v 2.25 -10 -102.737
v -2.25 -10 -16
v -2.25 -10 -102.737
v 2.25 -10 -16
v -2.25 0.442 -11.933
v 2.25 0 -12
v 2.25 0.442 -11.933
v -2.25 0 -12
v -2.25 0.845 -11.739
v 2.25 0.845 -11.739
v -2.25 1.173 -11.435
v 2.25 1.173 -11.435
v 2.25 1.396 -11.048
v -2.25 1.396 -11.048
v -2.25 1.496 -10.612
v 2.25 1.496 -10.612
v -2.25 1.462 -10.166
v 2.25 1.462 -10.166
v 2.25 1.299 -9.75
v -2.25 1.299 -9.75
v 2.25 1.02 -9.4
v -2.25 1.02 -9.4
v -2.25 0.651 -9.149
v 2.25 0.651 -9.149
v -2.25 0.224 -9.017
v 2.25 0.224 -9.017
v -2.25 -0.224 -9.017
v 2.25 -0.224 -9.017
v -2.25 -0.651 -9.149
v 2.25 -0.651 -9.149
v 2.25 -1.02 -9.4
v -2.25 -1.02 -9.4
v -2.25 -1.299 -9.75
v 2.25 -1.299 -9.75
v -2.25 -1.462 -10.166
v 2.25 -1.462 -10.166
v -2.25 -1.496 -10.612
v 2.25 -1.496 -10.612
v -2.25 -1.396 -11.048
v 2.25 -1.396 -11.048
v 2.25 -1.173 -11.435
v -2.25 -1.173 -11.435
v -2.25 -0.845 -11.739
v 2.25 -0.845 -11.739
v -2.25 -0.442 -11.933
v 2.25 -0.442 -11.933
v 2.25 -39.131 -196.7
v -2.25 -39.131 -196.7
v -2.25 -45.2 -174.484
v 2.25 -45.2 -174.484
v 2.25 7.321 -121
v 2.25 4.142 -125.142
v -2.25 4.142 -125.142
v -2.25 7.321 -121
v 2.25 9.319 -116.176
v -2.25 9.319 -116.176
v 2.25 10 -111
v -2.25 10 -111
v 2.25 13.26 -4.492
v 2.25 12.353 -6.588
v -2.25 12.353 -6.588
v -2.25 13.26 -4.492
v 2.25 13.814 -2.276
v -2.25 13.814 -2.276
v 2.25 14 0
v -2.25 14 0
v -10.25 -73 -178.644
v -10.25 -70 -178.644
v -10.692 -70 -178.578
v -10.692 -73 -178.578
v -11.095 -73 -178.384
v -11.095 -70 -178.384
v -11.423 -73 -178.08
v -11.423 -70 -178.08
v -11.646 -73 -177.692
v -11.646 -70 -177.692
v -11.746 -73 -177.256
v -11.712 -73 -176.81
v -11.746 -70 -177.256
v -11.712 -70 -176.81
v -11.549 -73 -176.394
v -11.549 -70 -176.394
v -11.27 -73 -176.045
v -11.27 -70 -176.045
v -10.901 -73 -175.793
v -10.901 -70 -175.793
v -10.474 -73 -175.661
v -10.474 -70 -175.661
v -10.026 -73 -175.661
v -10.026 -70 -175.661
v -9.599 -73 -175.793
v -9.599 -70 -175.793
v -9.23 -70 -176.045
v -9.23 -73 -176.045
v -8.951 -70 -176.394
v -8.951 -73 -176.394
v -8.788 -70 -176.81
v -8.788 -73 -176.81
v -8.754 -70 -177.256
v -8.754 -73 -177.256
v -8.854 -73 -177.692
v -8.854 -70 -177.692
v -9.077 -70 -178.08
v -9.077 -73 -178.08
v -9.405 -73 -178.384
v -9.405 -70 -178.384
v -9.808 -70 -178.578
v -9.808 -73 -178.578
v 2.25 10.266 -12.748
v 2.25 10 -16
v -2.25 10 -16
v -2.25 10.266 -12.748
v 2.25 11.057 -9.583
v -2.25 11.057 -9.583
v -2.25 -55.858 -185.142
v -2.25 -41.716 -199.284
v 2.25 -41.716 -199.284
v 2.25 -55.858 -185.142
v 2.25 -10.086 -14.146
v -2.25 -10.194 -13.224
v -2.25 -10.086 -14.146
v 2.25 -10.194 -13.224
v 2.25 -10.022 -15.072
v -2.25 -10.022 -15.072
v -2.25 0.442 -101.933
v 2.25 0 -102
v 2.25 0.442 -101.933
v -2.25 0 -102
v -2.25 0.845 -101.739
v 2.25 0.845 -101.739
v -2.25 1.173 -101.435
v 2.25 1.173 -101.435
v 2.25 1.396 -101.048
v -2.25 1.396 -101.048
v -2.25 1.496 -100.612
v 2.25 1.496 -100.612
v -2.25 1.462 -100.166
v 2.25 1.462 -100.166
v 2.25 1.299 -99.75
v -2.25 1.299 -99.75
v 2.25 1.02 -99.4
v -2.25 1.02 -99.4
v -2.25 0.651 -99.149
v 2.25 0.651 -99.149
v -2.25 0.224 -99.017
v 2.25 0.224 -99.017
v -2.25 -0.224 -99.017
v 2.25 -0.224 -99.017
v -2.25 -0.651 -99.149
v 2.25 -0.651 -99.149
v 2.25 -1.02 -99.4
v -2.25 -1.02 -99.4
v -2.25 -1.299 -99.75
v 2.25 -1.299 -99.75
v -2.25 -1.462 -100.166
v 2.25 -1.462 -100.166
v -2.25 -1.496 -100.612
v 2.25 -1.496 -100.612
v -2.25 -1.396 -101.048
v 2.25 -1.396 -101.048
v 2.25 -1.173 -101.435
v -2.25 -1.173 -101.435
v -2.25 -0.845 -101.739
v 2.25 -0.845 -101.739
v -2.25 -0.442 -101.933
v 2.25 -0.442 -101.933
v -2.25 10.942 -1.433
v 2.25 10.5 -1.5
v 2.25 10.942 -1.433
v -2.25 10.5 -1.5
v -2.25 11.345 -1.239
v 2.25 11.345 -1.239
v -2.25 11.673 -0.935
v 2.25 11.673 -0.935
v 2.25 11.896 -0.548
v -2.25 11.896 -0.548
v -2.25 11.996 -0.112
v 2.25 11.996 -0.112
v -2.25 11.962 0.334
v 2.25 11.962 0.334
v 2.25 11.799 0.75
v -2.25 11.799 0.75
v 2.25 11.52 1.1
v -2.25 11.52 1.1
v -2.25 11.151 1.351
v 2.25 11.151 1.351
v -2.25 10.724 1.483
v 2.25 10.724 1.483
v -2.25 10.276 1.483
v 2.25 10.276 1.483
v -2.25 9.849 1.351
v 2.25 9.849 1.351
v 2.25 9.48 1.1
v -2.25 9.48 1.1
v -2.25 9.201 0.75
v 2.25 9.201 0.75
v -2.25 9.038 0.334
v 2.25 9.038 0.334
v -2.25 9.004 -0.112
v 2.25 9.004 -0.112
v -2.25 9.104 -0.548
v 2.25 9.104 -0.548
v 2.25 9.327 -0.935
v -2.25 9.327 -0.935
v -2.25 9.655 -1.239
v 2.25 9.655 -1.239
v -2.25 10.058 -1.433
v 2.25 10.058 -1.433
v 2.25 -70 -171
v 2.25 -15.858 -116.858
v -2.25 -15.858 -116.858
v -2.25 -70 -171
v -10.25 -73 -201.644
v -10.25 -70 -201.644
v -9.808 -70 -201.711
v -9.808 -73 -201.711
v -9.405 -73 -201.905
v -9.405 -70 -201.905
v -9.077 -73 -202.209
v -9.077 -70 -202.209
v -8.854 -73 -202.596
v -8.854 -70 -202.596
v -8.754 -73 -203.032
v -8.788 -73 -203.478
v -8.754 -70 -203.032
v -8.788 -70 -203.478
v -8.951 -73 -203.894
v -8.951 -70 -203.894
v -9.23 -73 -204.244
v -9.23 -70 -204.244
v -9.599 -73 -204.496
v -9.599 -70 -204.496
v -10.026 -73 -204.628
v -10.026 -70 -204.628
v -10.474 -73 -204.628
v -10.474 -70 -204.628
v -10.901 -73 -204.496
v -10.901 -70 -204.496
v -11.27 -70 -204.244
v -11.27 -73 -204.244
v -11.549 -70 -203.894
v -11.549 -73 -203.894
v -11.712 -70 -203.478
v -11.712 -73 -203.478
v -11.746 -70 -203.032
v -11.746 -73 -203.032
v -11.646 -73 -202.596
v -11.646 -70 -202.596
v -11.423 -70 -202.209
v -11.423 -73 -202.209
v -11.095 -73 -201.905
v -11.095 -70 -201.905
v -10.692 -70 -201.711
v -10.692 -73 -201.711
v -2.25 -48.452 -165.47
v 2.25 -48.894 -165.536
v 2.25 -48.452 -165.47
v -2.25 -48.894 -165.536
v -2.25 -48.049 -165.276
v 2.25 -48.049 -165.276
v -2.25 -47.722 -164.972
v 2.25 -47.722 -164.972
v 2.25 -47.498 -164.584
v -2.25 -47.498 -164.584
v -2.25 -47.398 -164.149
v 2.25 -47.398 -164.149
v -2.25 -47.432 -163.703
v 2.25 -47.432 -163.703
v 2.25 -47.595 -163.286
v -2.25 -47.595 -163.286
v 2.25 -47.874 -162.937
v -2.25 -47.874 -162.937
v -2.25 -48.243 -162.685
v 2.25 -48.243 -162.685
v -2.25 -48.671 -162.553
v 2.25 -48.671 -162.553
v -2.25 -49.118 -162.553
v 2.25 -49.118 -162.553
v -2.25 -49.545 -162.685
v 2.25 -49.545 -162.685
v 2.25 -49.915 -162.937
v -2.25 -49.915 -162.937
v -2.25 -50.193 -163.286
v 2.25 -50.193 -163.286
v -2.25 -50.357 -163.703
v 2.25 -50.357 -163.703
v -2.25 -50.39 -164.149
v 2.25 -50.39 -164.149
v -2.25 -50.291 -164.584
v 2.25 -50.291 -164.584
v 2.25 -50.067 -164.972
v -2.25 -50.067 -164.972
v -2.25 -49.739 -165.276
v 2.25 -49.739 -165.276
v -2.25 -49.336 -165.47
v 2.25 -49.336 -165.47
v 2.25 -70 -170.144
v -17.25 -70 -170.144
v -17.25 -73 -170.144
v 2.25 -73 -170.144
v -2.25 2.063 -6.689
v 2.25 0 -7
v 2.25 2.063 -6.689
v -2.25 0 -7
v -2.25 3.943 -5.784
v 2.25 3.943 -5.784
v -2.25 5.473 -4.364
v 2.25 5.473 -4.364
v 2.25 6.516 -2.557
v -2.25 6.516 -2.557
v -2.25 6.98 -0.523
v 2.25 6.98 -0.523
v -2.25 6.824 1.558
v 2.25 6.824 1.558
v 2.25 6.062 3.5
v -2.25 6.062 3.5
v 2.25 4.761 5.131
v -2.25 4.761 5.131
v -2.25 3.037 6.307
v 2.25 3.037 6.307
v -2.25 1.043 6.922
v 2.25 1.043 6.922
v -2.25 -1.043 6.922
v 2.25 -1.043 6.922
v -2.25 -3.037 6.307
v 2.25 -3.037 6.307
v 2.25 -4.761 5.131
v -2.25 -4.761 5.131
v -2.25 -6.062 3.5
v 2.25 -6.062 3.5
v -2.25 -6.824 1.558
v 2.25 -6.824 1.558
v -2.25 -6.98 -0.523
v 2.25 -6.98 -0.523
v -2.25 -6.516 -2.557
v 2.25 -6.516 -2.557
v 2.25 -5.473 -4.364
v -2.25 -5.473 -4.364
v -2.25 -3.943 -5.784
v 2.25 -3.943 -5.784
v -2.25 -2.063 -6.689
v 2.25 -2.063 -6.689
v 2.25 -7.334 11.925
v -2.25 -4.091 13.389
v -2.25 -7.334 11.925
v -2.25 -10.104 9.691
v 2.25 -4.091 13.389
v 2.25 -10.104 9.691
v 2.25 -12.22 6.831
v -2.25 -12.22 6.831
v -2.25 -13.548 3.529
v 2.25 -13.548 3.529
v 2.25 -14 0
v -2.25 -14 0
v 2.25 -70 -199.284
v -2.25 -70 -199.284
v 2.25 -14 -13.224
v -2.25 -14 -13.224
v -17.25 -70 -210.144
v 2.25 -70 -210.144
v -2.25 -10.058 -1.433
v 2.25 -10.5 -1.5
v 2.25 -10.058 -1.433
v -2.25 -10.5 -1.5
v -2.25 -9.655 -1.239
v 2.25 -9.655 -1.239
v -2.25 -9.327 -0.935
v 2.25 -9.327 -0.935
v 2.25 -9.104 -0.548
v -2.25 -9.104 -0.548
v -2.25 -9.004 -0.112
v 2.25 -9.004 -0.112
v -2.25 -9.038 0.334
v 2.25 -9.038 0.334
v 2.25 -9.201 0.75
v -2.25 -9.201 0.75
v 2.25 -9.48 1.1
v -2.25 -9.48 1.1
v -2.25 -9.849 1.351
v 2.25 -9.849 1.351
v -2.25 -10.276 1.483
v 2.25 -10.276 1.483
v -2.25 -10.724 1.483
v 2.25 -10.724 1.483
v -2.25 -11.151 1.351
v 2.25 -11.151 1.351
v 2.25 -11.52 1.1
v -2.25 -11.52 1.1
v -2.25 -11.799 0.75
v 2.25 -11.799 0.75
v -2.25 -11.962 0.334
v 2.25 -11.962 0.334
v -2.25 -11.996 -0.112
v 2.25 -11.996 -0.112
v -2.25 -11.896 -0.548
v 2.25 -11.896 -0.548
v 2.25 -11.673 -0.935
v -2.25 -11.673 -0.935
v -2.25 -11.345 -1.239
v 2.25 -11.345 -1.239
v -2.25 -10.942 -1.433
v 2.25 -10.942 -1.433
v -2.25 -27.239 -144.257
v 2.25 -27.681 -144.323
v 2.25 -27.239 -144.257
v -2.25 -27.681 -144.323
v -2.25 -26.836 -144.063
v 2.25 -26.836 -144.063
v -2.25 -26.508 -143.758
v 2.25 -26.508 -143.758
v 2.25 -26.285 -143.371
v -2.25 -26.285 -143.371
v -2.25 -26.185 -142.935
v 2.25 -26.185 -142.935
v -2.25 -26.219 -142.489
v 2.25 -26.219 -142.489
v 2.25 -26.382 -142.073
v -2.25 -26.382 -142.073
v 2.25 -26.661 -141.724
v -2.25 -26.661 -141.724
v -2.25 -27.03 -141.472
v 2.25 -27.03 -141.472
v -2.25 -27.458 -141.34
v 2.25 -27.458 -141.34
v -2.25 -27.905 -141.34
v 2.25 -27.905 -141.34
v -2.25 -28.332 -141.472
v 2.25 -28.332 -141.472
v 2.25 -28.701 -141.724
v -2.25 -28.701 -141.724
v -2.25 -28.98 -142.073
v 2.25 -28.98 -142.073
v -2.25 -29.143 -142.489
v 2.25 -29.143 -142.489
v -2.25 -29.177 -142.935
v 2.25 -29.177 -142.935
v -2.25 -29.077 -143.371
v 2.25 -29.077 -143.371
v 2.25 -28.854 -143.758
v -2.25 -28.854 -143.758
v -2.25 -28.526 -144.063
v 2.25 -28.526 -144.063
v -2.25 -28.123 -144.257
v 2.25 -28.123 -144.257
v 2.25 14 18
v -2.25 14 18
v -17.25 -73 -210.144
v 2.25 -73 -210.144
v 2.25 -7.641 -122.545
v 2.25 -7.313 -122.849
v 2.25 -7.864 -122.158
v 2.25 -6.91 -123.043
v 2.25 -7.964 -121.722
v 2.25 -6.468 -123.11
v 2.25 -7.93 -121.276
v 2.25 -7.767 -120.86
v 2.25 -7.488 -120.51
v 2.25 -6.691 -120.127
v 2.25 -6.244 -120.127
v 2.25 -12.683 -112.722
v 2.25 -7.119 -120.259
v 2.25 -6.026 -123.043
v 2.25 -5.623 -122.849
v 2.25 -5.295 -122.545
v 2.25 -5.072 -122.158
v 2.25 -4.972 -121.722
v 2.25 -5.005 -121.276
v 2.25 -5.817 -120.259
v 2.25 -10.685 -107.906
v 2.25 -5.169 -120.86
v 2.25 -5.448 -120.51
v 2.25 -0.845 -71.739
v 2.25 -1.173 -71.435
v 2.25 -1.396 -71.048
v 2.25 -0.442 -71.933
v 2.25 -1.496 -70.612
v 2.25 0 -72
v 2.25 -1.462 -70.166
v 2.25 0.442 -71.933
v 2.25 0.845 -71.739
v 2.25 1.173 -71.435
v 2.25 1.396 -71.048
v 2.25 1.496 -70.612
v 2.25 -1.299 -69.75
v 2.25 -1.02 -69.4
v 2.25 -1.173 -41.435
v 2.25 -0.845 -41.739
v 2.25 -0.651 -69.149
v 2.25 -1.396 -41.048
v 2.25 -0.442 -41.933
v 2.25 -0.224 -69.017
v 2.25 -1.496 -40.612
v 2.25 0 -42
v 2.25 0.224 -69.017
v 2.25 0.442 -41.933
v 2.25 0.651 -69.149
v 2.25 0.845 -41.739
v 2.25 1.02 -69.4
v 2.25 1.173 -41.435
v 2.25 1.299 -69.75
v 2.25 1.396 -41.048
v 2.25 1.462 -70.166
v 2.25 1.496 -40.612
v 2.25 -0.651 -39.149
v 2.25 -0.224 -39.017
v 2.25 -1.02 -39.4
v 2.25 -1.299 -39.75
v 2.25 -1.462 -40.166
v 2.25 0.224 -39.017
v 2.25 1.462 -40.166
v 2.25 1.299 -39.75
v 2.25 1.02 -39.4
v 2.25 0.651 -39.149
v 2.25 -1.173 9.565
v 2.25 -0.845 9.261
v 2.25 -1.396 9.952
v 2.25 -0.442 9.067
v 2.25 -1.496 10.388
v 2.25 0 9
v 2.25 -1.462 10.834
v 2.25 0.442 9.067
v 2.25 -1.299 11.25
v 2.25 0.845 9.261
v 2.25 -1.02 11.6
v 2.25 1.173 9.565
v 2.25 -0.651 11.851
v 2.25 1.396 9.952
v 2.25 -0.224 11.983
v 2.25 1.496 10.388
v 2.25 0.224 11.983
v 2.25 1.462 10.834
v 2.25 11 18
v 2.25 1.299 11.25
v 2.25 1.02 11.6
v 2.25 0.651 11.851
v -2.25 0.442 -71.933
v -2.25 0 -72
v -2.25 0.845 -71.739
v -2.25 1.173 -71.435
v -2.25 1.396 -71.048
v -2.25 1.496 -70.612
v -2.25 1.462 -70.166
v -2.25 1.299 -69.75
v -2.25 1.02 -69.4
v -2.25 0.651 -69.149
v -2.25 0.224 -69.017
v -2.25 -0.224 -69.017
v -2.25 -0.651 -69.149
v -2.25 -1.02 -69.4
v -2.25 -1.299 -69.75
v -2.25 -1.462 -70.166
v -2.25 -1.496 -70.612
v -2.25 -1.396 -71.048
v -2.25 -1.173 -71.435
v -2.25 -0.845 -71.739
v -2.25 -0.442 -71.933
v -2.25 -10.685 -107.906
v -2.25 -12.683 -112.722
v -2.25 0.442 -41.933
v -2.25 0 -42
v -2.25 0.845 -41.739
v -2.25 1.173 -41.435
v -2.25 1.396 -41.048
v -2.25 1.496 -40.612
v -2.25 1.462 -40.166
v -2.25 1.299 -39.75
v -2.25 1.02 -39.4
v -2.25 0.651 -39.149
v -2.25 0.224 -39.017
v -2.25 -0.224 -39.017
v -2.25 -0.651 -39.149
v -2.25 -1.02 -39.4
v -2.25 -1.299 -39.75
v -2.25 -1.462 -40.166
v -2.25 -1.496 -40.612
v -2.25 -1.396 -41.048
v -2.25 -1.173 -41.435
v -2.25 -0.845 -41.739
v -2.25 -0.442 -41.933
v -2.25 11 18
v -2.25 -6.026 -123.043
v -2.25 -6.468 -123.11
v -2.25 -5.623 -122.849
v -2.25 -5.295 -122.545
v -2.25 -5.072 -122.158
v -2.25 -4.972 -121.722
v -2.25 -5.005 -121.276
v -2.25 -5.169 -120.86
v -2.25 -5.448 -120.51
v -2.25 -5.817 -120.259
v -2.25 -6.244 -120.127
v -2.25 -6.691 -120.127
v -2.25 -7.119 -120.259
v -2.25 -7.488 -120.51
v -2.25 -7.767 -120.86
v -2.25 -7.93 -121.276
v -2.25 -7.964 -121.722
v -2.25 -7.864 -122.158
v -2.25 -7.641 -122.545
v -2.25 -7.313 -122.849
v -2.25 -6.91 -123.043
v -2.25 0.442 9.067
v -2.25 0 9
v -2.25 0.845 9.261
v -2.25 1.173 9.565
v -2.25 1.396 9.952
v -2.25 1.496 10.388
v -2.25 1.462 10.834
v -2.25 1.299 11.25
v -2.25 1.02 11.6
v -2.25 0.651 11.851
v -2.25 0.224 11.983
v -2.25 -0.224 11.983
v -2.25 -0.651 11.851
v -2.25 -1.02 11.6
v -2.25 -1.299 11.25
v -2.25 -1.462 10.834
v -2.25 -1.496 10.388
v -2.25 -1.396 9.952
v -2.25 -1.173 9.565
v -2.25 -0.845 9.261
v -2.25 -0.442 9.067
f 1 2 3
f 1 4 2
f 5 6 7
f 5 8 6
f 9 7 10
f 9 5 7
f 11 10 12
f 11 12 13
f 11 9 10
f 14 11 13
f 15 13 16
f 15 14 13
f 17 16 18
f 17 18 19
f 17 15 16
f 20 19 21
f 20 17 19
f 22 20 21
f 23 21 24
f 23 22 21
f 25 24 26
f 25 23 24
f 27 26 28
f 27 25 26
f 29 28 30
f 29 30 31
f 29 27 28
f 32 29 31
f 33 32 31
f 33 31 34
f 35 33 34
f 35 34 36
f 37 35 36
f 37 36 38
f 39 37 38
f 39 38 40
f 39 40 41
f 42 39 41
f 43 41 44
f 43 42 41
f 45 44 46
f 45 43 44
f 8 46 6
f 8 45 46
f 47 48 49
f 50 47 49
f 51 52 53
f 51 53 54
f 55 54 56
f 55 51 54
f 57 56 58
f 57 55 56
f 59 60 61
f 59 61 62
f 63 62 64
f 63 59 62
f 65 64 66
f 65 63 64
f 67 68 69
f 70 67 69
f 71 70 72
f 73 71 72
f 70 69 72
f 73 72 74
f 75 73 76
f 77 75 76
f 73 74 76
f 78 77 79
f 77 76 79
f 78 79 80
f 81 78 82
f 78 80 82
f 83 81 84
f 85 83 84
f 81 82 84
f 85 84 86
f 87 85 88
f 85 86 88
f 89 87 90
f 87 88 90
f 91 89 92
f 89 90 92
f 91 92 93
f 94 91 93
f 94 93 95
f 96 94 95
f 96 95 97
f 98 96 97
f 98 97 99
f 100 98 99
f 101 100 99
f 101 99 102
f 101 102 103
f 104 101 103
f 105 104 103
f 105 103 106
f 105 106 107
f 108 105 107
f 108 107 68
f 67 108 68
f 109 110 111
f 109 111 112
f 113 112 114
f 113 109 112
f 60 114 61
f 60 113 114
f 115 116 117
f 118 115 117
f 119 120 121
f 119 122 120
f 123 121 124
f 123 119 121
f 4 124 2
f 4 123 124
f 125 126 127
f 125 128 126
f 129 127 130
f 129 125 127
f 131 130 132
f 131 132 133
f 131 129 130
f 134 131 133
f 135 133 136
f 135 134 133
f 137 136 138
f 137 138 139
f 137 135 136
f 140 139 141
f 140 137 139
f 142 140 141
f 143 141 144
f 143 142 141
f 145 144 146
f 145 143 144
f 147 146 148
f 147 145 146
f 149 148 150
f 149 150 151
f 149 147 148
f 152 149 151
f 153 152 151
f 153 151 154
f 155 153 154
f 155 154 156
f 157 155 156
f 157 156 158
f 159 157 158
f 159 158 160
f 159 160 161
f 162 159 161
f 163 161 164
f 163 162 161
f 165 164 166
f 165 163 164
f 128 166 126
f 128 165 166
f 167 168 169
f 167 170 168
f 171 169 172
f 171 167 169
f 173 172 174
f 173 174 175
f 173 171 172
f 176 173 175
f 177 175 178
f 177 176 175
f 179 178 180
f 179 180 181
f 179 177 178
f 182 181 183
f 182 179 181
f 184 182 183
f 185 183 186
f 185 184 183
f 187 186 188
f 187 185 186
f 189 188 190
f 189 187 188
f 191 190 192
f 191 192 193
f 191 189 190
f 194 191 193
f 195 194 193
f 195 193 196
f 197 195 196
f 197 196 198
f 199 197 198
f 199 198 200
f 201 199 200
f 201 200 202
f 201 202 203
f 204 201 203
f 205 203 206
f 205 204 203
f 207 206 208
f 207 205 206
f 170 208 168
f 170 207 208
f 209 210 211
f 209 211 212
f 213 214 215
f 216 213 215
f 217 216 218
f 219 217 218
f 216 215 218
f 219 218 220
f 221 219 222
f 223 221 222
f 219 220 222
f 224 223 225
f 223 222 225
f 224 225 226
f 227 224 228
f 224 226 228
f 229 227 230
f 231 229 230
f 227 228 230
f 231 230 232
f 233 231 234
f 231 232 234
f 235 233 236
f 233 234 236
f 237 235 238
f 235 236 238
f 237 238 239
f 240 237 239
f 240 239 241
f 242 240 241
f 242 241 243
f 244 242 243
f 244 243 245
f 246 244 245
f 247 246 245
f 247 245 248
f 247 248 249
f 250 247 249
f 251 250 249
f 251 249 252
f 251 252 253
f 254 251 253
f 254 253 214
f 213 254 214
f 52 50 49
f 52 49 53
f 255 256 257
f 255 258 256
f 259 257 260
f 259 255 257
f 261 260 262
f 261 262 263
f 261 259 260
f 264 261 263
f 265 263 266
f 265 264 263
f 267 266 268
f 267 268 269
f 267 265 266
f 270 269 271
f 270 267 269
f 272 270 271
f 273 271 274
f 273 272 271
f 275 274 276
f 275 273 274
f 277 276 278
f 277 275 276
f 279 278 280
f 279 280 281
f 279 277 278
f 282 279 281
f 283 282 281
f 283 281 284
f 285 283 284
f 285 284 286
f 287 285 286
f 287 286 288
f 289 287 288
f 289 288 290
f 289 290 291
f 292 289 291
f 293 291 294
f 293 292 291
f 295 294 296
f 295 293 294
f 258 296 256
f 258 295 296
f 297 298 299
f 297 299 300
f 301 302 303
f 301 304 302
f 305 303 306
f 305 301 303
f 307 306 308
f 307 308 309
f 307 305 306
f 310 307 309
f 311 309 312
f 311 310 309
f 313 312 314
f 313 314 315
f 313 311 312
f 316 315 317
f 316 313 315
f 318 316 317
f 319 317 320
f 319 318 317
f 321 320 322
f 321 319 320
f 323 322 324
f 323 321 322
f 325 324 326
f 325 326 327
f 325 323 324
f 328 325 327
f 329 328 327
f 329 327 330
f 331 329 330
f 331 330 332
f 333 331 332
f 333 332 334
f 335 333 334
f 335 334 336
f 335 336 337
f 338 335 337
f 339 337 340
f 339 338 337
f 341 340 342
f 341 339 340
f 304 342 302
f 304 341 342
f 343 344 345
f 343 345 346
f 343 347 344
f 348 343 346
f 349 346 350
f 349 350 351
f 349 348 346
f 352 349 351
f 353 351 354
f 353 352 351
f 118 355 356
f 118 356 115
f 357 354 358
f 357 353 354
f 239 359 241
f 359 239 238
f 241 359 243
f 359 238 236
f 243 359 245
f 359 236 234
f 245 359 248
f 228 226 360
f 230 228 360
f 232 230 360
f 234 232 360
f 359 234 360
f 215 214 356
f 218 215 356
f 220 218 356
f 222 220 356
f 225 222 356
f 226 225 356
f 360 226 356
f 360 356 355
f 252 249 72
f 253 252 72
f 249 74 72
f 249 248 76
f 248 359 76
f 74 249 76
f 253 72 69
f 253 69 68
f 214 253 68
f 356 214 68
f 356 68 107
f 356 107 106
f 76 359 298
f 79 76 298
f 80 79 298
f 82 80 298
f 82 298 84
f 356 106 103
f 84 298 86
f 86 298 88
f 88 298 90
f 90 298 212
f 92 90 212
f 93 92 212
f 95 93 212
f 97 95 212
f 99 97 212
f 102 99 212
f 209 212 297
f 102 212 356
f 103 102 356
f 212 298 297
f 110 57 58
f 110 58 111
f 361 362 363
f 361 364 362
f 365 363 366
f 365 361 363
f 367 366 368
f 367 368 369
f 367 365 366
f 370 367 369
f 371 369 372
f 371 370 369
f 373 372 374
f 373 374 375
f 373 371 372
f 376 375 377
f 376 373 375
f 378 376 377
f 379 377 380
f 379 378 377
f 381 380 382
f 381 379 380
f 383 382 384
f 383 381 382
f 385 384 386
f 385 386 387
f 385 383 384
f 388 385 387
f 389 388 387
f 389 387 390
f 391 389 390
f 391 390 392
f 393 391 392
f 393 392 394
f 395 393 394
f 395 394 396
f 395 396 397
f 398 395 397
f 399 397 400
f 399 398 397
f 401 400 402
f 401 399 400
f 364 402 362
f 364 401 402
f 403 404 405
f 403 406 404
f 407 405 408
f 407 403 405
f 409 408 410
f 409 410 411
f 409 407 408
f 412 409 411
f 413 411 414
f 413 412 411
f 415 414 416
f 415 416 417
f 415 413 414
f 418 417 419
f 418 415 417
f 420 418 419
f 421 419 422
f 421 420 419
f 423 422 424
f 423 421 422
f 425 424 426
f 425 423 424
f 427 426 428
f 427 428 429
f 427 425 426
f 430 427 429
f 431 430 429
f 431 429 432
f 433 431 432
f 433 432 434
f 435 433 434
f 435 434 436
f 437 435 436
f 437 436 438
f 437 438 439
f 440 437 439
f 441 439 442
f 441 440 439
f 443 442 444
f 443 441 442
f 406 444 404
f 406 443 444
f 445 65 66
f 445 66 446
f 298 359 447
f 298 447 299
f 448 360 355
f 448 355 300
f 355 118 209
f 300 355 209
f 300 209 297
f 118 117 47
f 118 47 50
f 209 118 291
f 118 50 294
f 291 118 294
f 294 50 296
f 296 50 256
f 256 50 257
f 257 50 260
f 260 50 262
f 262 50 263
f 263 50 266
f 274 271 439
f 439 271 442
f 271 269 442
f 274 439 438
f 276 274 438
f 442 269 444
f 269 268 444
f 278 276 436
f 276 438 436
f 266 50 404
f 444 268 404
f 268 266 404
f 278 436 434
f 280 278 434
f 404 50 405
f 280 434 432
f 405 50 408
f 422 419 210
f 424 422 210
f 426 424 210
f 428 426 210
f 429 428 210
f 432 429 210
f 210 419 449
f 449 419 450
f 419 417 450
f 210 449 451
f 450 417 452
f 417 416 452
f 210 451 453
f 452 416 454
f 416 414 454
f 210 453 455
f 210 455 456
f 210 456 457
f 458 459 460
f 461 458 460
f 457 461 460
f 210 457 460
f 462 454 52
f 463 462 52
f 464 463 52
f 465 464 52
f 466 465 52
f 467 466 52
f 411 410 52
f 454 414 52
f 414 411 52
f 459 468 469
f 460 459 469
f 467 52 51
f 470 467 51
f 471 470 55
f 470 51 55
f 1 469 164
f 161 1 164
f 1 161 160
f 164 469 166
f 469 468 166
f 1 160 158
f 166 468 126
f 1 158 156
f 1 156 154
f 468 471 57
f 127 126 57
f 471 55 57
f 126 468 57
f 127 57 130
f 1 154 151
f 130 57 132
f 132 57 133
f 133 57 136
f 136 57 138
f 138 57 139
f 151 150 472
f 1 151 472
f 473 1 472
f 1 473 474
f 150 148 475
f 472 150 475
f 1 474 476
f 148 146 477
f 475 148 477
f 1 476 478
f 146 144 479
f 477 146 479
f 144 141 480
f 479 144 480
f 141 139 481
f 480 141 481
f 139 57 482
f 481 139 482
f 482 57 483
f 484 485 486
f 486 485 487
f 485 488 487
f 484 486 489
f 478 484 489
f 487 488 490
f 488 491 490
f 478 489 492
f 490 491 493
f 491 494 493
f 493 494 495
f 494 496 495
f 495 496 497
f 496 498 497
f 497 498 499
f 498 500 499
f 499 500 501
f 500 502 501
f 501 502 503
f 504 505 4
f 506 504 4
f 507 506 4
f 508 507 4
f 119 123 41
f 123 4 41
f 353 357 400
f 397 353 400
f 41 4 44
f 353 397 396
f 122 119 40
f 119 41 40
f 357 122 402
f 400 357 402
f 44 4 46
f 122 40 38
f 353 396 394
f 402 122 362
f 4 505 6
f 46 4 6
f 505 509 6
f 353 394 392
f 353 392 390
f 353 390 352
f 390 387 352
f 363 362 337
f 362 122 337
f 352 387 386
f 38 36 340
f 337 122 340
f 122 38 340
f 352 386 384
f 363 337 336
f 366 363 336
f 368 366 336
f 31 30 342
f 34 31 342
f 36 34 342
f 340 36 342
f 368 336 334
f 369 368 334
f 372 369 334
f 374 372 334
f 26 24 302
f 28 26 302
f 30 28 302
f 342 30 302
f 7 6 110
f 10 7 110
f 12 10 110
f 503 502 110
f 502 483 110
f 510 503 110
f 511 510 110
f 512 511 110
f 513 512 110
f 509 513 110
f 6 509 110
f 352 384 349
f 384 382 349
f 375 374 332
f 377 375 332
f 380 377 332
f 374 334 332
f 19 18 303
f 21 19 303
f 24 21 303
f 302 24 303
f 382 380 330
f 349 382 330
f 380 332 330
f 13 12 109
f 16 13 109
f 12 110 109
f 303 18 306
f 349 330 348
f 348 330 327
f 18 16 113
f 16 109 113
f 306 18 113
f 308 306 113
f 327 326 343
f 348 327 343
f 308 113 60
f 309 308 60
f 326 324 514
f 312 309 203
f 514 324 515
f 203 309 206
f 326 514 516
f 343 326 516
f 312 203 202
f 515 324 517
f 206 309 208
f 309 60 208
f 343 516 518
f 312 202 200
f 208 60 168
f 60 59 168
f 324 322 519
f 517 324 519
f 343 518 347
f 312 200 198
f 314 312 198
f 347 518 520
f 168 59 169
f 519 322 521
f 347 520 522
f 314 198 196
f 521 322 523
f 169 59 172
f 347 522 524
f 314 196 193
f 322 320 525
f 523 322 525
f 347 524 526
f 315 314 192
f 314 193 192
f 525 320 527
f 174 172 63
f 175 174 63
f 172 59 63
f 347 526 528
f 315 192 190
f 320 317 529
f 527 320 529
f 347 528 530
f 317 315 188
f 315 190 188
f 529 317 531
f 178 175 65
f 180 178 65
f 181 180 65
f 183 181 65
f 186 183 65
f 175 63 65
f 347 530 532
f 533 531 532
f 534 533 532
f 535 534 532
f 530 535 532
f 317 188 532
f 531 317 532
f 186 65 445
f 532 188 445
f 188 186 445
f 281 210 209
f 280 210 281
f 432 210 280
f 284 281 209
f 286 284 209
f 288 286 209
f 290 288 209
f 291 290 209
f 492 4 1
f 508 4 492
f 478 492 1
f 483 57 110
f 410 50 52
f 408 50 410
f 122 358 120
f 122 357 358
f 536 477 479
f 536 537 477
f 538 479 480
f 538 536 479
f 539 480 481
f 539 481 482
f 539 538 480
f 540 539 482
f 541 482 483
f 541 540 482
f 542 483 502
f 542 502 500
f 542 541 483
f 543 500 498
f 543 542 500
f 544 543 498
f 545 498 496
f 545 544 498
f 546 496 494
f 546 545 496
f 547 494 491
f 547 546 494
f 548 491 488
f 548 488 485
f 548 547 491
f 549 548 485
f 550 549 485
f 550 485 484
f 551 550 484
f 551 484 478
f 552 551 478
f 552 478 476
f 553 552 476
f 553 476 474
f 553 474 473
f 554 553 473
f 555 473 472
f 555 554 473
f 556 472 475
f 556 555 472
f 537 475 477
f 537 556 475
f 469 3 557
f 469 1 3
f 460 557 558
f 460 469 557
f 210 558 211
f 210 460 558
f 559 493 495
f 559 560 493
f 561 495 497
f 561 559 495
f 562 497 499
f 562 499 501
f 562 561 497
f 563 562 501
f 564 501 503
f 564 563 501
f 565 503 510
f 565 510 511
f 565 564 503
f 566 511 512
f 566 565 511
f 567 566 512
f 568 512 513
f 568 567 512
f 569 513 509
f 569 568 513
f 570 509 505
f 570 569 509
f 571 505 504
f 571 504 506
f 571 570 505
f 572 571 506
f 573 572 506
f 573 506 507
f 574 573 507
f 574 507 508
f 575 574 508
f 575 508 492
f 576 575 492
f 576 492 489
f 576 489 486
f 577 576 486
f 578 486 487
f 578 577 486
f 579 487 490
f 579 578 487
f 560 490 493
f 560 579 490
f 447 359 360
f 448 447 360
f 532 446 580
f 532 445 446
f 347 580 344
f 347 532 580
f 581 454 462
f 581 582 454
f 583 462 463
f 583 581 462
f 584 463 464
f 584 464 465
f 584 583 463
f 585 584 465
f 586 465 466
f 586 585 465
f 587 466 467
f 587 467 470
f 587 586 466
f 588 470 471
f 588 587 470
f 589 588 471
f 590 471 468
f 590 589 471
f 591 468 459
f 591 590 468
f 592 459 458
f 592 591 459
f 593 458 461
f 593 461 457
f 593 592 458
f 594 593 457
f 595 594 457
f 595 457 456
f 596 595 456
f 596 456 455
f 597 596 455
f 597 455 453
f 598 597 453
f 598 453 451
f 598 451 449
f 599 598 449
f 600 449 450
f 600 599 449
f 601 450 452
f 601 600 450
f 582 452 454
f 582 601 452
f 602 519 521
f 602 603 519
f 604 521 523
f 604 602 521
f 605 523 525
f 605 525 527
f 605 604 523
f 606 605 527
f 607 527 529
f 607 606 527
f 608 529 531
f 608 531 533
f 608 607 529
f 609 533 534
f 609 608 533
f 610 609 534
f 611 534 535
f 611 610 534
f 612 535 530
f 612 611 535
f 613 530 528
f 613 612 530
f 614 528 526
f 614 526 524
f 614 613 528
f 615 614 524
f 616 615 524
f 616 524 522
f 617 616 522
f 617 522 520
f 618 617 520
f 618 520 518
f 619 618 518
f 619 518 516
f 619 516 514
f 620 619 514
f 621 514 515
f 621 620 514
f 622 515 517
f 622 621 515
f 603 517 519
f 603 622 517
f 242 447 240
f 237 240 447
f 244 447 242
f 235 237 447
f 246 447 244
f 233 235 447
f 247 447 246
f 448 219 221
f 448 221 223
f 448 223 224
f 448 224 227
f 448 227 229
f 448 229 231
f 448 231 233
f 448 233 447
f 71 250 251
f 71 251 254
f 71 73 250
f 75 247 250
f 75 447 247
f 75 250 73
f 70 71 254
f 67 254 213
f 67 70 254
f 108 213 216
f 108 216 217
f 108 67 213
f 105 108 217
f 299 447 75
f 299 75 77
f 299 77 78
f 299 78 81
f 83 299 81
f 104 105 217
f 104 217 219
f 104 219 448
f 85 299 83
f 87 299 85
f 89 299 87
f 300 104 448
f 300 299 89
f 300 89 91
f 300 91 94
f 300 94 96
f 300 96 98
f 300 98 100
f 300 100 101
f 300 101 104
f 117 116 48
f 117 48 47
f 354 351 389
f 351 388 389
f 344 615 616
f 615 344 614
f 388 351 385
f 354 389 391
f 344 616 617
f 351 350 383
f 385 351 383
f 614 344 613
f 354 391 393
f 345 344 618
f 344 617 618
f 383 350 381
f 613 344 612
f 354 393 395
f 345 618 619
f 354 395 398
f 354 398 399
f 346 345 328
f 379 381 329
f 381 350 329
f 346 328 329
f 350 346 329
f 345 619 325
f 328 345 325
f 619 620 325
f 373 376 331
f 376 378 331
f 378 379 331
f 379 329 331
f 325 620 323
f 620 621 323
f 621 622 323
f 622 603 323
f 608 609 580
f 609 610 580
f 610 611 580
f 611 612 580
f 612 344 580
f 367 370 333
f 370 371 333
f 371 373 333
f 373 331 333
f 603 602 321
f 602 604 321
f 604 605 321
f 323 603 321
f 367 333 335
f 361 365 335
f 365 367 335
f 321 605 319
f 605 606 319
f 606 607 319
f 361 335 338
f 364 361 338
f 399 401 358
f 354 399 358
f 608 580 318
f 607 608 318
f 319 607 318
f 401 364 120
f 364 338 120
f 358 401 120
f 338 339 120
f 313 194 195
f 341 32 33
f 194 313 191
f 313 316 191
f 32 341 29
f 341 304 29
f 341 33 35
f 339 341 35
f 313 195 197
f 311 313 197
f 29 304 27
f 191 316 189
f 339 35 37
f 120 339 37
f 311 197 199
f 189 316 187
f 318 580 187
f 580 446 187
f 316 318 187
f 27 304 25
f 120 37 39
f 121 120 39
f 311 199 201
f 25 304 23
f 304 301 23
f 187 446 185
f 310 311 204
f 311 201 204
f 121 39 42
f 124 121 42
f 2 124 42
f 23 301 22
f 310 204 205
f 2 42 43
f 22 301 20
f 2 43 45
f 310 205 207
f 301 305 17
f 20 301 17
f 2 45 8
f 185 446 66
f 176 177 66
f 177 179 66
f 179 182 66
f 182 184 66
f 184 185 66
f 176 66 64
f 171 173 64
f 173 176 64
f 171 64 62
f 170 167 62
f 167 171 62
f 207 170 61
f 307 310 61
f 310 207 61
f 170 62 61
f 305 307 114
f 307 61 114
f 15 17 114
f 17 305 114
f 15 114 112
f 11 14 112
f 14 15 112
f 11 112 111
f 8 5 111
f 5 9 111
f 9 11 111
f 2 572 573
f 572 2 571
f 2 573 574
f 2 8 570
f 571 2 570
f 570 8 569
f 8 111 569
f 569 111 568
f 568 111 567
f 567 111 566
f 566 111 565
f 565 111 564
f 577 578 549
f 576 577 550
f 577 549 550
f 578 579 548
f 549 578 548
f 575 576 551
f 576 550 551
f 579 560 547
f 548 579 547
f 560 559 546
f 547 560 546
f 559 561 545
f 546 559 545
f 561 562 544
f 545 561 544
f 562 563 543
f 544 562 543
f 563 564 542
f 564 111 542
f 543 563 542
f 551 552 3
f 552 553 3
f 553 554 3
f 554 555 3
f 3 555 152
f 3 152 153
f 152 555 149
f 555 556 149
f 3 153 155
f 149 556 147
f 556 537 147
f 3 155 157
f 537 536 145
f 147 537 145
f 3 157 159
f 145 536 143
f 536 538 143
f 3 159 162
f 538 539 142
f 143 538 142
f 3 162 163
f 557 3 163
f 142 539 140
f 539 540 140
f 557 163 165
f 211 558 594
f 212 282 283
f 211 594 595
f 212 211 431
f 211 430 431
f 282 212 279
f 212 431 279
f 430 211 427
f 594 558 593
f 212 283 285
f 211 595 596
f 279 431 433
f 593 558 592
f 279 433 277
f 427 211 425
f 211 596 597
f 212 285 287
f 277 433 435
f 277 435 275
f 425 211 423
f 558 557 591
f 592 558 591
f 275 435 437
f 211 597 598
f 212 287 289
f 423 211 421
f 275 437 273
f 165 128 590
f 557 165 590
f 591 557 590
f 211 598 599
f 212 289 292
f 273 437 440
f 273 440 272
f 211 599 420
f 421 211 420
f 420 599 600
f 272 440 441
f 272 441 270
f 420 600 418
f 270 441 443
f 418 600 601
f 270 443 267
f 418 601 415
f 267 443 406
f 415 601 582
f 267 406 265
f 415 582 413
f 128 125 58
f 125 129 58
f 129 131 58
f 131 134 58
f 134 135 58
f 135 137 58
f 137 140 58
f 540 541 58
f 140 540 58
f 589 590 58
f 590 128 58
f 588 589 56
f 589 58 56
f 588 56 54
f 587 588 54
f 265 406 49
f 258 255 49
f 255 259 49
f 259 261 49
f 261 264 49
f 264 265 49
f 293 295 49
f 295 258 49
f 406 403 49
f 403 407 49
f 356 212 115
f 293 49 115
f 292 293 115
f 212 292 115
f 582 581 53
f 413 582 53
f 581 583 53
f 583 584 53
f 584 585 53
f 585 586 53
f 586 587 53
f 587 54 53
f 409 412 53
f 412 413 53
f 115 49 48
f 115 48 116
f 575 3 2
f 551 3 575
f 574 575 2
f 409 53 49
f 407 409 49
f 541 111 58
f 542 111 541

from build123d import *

# Parameters (mm, degrees)
SKETCH_1_R          = 1.5
SKETCH_1_R_2        = 7
EXTRUDE_1_DEPTH     = 2.25
SKETCH_3_W          = 19.5
SKETCH_3_H          = 40
EXTRUDE_2_DEPTH     = 3
SKETCH_4_R          = 1.5
CUT_EXTRUDE_1_DEPTH = 227.967348396
SKETCH_5_W          = 4.5
SKETCH_5_H          = 15.072529032
EXTRUDE_3_DEPTH     = 20
CUT_EXTRUDE_3_DEPTH = 10


with BuildPart() as part:
    # 草图1 → 凸台-拉伸1 (new, symmetric)
    with BuildSketch(Plane(origin=(0, 0, 0), x_dir=(0, 0, -1), z_dir=(1, 0, 0))):
        with BuildLine():
            ThreePointArc((102.736907967, -10), (110.379173808, -11.526455333), (116.85785315, -15.85785315))
            Line((116.85785315, -15.85785315), (171, -70))
            Line((171, -70), (199.284271247, -70))
            Line((199.284271247, -70), (125.142135624, 4.142135624))
            ThreePointArc((125.142135624, 4.142135624), (118.653668647, 8.47759065), (111, 10))
            Line((111, 10), (16, 10))
            ThreePointArc((16, 10), (11.149287499, 10.597149997), (6.588235294, 12.352941176))
            ThreePointArc((6.588235294, 12.352941176), (3.395498751, 13.581995002), (0, 14))
            Line((0, 14), (-18, 14))
            Line((-18, 14), (-18, 11))
            Line((-18, 11), (-13.388941598, -4.090995342))
            ThreePointArc((-13.388941598, -4.090995342), (-8.328447191, -11.253309175), (0, -14))
            Line((0, -14), (13.224243357, -14))
            Line((13.224243357, -14), (13.224243357, -10.193557234))
            ThreePointArc((13.224243357, -10.193557234), (14.608751519, -10.048447989), (16, -10))
            Line((16, -10), (102.736907967, -10))
        make_face()
        with Locations((164.036406871, -48.894271247)):
            Circle(SKETCH_1_R, mode=Mode.SUBTRACT)
        with Locations((142.823203436, -27.681067812)):
            Circle(SKETCH_1_R, mode=Mode.SUBTRACT)
        with Locations((0, -10.5)):
            Circle(SKETCH_1_R, mode=Mode.SUBTRACT)
        with Locations((-10.5, 0)):
            Circle(SKETCH_1_R, mode=Mode.SUBTRACT)
        Circle(SKETCH_1_R_2, mode=Mode.SUBTRACT)
        with Locations((10.5, 0)):
            Circle(SKETCH_1_R, mode=Mode.SUBTRACT)
        with Locations((0, 10.5)):
            Circle(SKETCH_1_R, mode=Mode.SUBTRACT)
        with Locations((40.5, 0)):
            Circle(SKETCH_1_R, mode=Mode.SUBTRACT)
        with Locations((70.5, 0)):
            Circle(SKETCH_1_R, mode=Mode.SUBTRACT)
        with Locations((121.61, -6.467864376)):
            Circle(SKETCH_1_R, mode=Mode.SUBTRACT)
        with Locations((100.5, 0)):
            Circle(SKETCH_1_R, mode=Mode.SUBTRACT)
    extrude(amount=EXTRUDE_1_DEPTH, both=True)

    # 草图3 → 凸台-拉伸2 (add)
    with BuildSketch(Plane.XZ.offset(70)):
        with Locations((-7.5, -190.144271247)):
            Rectangle(SKETCH_3_W, SKETCH_3_H)
    extrude(amount=EXTRUDE_2_DEPTH)

    # 草图4 → 切除-拉伸1 (cut, through all)
    with BuildSketch(Plane(origin=(0, -70, 0), x_dir=(1, 0, 0), z_dir=(0, 1, 0))):
        with Locations(Location((-10.25, 203.144271247, 0), (0, 0, 270))):
            Circle(SKETCH_4_R)
        with Locations(Location((-10.25, 177.144271247, 0), (0, 0, 90))):
            Circle(SKETCH_4_R)
    extrude(amount=-CUT_EXTRUDE_1_DEPTH, mode=Mode.SUBTRACT)

    # 草图5 → 凸台-拉伸3 (add)
    with BuildSketch(Plane(origin=(0, 64.642135624, -64.642135624), x_dir=(1, 0, 0), z_dir=(0, 0.7071067811865465, -0.7071067811865487))):
        with Locations((0, 162.87646975)):
            Rectangle(SKETCH_5_W, SKETCH_5_H)
    extrude(amount=EXTRUDE_3_DEPTH)

    # 草图9 → 切除-拉伸3 (cut)
    with BuildSketch(Plane.ZY.offset(2.25)):
        Polygon((-196.699542099, -39.130999604), (-174.484248136, -45.199976888), (-188.626383759, -31.057841264), align=None)
    extrude(amount=-CUT_EXTRUDE_3_DEPTH, mode=Mode.SUBTRACT)


solid = part.part
